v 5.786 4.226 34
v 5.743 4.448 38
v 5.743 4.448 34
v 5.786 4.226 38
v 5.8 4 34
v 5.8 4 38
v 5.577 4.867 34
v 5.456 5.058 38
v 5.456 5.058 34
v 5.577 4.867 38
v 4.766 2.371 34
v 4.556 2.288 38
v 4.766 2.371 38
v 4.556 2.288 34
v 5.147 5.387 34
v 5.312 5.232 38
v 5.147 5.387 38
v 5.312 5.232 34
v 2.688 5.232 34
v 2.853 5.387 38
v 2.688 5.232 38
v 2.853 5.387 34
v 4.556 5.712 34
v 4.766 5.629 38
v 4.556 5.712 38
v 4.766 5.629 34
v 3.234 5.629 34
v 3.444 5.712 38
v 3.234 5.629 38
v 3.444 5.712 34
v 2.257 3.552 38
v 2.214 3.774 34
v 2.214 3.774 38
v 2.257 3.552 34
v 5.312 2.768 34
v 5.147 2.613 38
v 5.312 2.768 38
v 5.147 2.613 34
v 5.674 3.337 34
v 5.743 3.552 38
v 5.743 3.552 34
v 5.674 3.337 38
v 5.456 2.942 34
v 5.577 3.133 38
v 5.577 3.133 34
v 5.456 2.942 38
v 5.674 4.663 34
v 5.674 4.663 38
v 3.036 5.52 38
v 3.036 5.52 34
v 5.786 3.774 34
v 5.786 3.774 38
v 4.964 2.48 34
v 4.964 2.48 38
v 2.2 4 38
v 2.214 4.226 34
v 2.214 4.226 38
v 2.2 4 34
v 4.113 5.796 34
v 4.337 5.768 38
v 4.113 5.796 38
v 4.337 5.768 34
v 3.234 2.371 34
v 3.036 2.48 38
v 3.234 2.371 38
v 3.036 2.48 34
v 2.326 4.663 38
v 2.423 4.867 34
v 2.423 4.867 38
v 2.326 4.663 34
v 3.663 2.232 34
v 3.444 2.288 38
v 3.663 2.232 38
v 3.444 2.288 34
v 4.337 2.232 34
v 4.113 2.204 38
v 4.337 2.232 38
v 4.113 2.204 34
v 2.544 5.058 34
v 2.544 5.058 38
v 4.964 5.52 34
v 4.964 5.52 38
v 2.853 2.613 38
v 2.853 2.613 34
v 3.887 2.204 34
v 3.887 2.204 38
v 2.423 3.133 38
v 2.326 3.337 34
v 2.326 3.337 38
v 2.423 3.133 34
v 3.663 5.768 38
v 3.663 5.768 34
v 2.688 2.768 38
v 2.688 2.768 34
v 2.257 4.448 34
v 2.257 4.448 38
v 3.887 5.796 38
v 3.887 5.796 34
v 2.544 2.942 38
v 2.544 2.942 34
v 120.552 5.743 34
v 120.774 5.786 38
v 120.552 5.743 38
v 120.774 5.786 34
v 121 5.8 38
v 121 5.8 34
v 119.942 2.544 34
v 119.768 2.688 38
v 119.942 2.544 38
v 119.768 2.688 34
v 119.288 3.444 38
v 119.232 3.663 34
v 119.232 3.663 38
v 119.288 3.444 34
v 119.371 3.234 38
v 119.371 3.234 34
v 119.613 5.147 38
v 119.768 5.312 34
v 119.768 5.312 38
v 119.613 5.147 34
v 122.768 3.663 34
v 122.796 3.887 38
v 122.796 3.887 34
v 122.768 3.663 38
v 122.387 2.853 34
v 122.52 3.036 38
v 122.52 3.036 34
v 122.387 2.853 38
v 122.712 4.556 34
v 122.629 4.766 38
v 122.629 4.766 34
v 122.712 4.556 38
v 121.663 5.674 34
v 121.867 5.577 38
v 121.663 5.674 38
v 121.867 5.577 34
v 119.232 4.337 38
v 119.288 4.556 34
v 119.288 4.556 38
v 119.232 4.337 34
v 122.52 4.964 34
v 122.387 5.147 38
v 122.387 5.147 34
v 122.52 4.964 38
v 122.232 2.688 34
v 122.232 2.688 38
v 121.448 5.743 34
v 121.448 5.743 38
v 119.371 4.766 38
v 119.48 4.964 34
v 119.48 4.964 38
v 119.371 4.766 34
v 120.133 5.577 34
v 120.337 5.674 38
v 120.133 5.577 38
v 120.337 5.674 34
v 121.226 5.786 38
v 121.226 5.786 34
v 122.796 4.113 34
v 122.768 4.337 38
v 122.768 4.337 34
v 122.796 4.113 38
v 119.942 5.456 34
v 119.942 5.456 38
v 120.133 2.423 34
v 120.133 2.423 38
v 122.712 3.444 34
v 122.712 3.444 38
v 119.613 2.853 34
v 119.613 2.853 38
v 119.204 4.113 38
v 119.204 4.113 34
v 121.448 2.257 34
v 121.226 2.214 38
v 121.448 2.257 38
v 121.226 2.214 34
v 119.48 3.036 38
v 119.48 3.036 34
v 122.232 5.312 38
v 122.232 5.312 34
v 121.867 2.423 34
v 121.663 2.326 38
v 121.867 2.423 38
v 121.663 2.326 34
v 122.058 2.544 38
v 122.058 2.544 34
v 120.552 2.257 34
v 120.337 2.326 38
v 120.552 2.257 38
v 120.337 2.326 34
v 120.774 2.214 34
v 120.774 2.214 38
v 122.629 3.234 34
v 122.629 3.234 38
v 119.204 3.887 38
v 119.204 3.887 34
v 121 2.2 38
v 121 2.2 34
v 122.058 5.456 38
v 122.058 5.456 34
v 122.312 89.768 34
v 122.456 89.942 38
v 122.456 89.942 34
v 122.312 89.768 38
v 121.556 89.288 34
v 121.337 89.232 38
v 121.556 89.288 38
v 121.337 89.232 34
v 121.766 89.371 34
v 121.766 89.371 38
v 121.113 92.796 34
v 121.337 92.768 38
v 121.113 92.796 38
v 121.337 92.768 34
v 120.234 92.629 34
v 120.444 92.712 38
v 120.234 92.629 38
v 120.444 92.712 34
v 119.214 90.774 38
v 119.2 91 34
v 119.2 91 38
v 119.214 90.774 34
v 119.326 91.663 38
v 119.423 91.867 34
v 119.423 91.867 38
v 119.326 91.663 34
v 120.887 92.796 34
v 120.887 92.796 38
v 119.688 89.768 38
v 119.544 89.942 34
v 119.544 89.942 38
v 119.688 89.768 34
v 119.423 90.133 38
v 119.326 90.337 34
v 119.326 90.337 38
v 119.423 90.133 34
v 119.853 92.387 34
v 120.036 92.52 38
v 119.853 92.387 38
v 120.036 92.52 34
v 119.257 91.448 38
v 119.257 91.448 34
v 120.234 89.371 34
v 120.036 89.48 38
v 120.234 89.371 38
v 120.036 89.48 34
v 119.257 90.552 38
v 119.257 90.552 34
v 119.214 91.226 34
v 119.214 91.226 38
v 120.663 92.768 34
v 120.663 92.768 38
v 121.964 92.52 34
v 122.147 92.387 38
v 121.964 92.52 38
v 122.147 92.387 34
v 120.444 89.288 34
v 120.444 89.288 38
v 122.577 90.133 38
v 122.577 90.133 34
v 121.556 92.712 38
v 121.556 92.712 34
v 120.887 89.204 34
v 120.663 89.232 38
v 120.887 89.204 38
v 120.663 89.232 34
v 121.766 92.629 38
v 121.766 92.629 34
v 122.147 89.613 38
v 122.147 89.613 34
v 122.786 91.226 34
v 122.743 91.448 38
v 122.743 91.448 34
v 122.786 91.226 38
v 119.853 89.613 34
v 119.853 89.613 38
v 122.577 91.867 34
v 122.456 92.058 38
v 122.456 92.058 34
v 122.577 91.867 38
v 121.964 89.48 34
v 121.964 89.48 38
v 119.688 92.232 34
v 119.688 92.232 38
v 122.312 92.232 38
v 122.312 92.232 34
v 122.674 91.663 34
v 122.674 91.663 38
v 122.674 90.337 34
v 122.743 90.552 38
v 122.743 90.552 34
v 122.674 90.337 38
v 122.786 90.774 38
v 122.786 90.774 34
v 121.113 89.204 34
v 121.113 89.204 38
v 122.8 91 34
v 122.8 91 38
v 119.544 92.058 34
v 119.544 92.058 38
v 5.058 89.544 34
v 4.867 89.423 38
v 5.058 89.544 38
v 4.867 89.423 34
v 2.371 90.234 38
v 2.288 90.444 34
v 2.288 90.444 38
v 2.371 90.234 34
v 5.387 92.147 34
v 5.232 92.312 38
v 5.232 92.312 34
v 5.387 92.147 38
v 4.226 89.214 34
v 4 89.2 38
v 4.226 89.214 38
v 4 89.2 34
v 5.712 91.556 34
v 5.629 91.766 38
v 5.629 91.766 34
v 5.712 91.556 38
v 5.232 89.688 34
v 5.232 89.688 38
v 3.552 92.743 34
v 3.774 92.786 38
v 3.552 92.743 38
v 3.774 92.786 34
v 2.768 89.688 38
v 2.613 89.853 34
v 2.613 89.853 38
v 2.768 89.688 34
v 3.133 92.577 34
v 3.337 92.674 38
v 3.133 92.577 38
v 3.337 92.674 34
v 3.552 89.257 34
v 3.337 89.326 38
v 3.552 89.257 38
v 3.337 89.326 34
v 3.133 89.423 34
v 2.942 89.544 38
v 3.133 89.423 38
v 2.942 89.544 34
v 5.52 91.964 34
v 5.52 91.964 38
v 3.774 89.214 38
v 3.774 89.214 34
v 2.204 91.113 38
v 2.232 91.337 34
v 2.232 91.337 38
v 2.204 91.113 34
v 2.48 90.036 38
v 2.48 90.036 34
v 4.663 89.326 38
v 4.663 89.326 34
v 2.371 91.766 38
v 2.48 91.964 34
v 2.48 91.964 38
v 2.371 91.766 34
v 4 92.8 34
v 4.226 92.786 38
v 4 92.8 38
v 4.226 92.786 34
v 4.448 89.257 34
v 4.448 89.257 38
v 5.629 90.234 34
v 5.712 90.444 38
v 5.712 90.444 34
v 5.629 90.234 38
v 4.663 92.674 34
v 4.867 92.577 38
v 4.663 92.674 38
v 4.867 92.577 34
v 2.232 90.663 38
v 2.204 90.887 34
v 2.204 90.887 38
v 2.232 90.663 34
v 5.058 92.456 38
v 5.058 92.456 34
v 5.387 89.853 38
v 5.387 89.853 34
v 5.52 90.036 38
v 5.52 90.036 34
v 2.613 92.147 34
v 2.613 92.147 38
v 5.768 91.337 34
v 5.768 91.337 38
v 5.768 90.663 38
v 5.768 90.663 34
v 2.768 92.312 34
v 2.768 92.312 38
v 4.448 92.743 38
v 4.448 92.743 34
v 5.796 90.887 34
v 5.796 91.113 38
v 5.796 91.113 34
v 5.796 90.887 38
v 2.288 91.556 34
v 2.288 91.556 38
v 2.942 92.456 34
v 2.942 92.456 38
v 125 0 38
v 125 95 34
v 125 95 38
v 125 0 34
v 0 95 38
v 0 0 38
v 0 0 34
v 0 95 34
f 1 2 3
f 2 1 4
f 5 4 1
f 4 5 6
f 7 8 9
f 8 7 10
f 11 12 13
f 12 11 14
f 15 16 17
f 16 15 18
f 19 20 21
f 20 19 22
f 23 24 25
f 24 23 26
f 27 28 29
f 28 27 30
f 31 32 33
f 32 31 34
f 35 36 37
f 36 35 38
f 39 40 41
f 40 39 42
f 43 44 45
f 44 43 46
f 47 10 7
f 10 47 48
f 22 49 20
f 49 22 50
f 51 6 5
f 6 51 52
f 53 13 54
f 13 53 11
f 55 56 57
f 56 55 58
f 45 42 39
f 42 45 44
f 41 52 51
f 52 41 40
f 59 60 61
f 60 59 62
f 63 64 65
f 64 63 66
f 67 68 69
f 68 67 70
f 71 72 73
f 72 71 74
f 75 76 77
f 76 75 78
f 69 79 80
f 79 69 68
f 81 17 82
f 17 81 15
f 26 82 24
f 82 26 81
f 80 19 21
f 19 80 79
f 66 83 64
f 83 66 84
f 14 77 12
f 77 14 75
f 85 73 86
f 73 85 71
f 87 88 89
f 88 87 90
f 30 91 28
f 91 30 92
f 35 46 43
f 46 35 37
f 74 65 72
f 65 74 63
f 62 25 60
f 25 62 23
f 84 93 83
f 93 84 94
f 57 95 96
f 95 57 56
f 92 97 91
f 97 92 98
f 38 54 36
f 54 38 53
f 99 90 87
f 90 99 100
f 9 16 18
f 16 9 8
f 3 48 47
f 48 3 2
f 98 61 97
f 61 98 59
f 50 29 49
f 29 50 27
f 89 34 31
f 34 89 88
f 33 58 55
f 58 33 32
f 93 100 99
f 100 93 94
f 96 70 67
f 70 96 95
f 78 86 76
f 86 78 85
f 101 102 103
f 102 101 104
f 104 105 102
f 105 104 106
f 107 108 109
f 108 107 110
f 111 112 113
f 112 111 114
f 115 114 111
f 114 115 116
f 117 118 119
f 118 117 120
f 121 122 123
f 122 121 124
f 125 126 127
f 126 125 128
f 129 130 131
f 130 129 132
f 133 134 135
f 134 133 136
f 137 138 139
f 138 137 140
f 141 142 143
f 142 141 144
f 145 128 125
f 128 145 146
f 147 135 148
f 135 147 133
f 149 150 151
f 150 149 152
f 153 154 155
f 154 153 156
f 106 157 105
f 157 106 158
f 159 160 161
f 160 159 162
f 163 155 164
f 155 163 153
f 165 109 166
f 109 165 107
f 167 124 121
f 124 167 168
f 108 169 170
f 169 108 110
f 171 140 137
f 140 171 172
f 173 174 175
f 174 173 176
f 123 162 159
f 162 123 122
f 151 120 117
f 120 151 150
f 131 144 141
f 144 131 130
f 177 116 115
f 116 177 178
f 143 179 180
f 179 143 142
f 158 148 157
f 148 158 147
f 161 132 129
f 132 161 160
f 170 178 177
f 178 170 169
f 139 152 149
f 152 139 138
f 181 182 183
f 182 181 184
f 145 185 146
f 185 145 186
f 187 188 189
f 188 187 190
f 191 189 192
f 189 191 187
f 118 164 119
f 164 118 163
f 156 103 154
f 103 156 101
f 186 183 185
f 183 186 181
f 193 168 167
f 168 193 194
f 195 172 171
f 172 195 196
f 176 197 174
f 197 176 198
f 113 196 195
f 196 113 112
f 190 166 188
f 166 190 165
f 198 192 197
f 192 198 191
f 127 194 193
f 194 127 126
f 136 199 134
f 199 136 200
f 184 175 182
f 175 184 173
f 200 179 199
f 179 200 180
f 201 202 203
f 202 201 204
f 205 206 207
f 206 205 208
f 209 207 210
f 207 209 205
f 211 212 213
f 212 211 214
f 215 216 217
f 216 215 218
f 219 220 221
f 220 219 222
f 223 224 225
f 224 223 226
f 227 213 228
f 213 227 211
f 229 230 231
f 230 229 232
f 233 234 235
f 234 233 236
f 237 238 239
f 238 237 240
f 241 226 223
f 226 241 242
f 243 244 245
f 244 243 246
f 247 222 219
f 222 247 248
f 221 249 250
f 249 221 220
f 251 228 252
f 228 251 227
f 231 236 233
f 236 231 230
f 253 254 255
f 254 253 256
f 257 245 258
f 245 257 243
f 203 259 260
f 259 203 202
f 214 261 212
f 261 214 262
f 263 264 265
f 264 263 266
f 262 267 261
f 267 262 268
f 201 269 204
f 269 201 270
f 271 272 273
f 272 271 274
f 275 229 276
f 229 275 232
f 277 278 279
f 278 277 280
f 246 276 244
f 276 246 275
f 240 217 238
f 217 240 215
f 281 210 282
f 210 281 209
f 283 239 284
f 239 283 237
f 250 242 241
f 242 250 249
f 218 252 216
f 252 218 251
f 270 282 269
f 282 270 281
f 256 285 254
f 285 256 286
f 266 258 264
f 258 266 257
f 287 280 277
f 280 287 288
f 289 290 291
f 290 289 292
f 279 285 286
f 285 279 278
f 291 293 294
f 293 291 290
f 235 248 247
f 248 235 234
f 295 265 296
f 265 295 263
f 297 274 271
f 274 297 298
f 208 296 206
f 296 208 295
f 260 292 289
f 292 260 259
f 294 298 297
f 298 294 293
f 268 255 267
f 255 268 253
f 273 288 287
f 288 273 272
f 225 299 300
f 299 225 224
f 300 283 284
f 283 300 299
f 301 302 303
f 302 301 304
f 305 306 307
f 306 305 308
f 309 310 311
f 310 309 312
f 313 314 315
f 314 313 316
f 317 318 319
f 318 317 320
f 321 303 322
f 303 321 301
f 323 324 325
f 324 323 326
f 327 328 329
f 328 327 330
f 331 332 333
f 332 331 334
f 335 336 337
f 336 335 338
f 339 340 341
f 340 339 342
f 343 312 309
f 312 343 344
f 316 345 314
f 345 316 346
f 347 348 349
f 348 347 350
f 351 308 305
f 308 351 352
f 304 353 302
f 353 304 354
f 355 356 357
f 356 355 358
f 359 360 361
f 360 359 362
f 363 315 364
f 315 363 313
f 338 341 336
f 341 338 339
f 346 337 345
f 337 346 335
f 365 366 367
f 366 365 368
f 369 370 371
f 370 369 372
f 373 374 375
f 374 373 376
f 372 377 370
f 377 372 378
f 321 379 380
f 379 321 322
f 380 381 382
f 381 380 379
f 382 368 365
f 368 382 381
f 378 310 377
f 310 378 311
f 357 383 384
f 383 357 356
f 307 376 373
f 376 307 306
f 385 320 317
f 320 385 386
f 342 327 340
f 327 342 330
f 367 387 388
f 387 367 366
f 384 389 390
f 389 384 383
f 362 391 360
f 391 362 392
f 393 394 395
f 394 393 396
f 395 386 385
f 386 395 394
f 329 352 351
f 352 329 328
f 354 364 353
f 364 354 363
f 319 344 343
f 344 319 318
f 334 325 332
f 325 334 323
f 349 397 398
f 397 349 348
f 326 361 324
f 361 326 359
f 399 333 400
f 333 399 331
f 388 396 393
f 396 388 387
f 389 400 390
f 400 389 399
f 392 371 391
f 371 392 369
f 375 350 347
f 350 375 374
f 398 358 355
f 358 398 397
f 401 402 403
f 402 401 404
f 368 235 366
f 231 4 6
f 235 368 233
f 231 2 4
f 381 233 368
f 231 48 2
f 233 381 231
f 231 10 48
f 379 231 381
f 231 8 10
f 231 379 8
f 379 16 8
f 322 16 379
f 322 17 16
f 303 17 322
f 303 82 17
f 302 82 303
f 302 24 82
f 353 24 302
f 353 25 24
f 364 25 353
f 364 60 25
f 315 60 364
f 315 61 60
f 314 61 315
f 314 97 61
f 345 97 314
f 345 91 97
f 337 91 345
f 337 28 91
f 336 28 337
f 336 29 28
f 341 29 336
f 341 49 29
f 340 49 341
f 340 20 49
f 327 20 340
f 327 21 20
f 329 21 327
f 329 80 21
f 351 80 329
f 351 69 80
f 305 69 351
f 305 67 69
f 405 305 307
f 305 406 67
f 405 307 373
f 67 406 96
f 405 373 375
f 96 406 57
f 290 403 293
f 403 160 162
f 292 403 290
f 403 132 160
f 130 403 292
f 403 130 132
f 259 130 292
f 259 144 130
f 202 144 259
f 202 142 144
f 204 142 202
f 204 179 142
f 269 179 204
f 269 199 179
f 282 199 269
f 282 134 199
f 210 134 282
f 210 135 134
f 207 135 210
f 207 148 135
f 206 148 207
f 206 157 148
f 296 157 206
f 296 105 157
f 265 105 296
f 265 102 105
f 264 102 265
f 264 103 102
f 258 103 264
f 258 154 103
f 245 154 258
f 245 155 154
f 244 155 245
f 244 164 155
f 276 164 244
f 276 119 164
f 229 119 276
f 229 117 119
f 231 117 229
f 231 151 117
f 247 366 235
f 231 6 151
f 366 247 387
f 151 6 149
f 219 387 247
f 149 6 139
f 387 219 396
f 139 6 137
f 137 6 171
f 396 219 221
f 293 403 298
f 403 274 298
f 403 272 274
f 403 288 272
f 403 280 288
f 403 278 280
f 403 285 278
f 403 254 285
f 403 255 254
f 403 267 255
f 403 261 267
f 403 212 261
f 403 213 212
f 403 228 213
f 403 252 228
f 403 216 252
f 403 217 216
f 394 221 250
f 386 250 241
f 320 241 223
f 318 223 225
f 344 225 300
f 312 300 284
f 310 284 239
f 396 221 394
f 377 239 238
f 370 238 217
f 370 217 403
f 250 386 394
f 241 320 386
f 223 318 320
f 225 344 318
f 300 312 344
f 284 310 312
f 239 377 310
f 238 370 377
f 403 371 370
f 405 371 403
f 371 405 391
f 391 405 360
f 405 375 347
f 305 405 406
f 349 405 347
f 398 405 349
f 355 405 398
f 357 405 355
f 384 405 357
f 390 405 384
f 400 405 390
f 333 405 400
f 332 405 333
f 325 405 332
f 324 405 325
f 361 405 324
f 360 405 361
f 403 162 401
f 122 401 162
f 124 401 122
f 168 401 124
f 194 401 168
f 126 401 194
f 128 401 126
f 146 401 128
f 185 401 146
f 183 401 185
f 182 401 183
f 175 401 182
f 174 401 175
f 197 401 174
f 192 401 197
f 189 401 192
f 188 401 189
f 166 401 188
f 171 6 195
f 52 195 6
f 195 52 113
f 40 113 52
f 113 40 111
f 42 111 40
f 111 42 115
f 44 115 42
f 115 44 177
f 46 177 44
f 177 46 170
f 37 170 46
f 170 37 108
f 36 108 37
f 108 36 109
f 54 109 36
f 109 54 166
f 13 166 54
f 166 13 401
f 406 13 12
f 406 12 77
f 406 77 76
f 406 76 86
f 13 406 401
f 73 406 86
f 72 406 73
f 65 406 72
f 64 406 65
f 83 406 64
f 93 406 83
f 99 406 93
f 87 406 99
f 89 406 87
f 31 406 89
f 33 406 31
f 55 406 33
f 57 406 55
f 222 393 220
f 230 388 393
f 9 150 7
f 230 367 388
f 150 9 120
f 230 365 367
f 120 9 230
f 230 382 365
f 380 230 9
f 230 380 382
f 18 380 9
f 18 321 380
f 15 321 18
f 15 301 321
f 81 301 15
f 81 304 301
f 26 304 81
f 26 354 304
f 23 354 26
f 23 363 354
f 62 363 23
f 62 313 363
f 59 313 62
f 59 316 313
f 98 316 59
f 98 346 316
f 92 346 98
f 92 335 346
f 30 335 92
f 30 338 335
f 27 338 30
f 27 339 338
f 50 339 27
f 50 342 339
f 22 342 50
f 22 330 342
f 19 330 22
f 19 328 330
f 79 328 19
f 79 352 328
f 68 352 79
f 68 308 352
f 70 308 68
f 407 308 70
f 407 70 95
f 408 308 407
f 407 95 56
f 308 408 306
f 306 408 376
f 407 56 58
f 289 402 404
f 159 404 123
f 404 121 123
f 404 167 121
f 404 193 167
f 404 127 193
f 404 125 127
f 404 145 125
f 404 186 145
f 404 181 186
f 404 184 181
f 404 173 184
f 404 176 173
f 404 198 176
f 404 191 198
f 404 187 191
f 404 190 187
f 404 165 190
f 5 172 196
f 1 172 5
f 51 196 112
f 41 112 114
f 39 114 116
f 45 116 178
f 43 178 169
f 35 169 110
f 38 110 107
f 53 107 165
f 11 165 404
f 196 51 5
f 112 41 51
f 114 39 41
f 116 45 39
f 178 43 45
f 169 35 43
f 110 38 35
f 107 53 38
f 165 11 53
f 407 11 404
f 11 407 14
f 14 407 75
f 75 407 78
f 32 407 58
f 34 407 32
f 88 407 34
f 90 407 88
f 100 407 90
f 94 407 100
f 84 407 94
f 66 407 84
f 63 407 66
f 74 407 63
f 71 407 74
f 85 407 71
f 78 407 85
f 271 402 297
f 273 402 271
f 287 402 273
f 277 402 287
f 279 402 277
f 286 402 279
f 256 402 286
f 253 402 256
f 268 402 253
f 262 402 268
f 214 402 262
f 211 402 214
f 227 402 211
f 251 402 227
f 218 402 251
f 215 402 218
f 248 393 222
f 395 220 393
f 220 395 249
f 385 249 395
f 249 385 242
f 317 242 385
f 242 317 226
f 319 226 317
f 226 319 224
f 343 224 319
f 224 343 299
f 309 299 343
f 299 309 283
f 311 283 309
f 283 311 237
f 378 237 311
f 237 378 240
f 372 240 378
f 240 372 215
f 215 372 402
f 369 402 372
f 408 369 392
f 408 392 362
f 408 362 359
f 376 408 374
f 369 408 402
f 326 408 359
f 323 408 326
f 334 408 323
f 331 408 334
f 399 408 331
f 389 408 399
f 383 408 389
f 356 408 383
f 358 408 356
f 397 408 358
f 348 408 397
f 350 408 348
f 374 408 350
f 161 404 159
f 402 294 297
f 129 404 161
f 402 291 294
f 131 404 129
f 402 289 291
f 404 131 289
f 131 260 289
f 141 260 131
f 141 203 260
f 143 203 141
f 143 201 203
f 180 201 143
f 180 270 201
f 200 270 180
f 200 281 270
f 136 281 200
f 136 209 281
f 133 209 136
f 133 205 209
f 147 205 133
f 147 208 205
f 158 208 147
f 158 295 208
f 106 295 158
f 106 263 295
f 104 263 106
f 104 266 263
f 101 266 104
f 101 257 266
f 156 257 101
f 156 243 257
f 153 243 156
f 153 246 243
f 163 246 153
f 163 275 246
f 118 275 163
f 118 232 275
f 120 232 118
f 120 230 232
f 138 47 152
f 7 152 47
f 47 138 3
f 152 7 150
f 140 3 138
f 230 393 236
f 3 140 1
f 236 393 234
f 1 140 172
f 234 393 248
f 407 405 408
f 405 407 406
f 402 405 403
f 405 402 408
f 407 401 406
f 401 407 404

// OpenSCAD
length = 64 + 26 + 35;
width = 38 + 40 + 10 + 7;
height = 38;
box = [length, width, height];
solenoid = [length - 4, 40, height];
opening = [40, 4, height];
pcb = [length - 4, 45, height];
tabHoleRadius = 3;
tab = [20, tabHoleRadius * 6, 6];

module screwMount() {
  translate(v=[-1, -1, -10]) {
  	translate(v=[3, 3, 3]) {
  	  cylinder(h = 10, r = 1.8, $fn = 50);
  	}
  }
}

difference() {
  union() {
    translate(v=[0, 0, height - 4]) {
      cube(size=[length, width, 4]);
    }
  }
  union() {
    // cover screw mounts
    translate(v=[2, 2, height]) {
    	screwMount();
    }
    translate(v=[length-2, 2, height]) {
      rotate( v = [0,0,1], a = 90 ) {
    	  screwMount();
    	}
    }
    translate(v=[length-2, width-2, height]) {
      rotate( v = [0,0,1], a = 180 ) {
    	  screwMount();
    	}
    }
    translate(v=[2, width-2, height]) {
      rotate( v = [0,0,1], a = 270 ) {
    	  screwMount();
    	}
    }
  }
}
